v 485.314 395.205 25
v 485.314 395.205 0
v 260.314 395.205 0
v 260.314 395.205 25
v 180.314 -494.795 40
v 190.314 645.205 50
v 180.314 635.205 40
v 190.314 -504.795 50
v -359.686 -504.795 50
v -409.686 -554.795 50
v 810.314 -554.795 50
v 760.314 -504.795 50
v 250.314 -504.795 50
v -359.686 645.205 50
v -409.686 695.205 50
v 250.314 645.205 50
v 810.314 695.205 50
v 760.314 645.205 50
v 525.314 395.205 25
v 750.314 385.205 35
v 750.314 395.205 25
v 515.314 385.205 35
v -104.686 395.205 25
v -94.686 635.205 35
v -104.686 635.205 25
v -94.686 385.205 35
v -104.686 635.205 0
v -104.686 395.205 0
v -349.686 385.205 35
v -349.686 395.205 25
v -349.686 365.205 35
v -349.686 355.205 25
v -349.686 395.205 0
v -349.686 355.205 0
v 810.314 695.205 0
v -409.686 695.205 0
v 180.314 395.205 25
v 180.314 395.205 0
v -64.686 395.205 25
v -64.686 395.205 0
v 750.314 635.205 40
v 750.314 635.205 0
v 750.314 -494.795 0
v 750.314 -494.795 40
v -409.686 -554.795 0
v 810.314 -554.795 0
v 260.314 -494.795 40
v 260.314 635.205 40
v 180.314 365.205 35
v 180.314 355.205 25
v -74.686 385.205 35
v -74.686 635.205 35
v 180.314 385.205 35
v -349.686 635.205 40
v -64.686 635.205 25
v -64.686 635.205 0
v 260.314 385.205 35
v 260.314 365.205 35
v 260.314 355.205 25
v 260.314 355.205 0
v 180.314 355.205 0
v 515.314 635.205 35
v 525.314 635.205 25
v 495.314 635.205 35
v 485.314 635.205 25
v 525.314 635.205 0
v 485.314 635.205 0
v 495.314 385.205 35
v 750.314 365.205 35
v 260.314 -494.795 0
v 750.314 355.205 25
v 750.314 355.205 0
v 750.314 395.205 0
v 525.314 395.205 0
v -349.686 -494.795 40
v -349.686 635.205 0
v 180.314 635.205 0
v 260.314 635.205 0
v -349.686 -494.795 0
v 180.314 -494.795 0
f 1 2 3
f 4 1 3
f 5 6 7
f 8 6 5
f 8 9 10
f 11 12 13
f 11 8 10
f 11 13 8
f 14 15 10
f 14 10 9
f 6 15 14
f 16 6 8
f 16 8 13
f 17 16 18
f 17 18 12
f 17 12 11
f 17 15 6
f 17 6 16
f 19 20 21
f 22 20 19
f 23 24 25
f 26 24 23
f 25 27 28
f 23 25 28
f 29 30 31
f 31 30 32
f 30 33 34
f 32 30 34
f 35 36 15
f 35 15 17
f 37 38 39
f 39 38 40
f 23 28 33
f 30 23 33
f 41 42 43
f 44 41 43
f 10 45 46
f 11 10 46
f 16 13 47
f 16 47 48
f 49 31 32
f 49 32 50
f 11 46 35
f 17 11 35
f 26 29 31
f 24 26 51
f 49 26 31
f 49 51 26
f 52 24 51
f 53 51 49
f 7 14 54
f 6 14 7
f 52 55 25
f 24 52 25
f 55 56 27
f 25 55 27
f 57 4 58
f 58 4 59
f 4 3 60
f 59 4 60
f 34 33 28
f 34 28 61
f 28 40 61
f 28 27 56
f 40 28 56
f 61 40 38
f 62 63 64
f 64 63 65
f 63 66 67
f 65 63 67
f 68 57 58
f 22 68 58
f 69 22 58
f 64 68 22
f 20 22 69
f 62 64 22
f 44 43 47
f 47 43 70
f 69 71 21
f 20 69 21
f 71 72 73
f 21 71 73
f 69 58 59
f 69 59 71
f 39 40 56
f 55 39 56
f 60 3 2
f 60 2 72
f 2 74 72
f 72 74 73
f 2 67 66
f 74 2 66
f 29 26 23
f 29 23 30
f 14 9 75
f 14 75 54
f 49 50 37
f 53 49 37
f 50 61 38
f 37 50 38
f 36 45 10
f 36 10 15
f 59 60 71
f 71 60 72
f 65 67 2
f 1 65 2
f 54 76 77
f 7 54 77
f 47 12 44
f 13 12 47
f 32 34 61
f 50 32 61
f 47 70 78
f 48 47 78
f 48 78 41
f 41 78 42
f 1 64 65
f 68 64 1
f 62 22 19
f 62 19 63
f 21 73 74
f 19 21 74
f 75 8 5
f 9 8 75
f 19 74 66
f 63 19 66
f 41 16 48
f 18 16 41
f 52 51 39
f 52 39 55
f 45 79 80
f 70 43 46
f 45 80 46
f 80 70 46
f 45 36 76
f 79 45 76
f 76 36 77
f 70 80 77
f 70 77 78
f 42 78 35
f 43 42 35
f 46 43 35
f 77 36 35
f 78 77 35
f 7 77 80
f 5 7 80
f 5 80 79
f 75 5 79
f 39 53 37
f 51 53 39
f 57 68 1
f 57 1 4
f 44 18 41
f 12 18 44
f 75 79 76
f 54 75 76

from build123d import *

# Parameters (mm, degrees)
F0_W      = 1220
F0_H      = 1250
F1_DEPTH  = 50
F2_DEPTH  = 35
F3_SIZE   = 10
F3_2_SIZE = 10
F3_3_SIZE = 10


with BuildPart() as f1:
    # F0 (on Top) → F1 (new body)
    with BuildSketch(Plane.XY):
        with Locations((200.3141621128, 70.2047318473)):
            Rectangle(F0_W, F0_H)
        Polygon((-349.6858378872, -494.7952681527), (-349.6858378872, 355.2047318473), (-349.6858378872, 395.2047318473), (-349.6858378872, 635.2047318473), (-104.6858378872, 635.2047318473), (-64.6858378872, 635.2047318473), (180.3141621128, 635.2047318473), (180.3141621128, 395.2047318473), (180.3141621128, 355.2047318473), (180.3141621128, -494.7952681527), align=None, mode=Mode.SUBTRACT)
        Polygon((260.3141621128, -494.7952681527), (260.3141621128, 355.2047318473), (260.3141621128, 395.2047318473), (260.3141621128, 635.2047318473), (485.3141621128, 635.2047318473), (525.3141621128, 635.2047318473), (750.3141621128, 635.2047318473), (750.3141621128, 395.2047318473), (750.3141621128, 355.2047318473), (750.3141621128, -494.7952681527), align=None, mode=Mode.SUBTRACT)
    extrude(amount=F1_DEPTH)

    # F3
    f3_edges = [f1.edges().sort_by_distance(p)[0] for p in [
        (-349.685838, 70.204732, 50),
        (-84.685838, 635.204732, 50),
        (180.314162, 70.204732, 50),
        (260.314162, 70.204732, 50),
        (505.314162, 635.204732, 50),
        (750.314162, 70.204732, 50),
        (505.314162, -494.795268, 50),
        (-84.685838, -494.795268, 50),
    ]]
    chamfer(f3_edges, length=F3_SIZE)


with BuildPart() as f2:
    # F0 (on Top) → F2 (new body)
    with BuildSketch(Plane.XY):
        Polygon((-349.6858378872, 395.2047318473), (-349.6858378872, 355.2047318473), (180.3141621128, 355.2047318473), (180.3141621128, 395.2047318473), (-64.6858378872, 395.2047318473), (-64.6858378872, 635.2047318473), (-104.6858378872, 635.2047318473), (-104.6858378872, 395.2047318473), align=None)
    extrude(amount=F2_DEPTH)

    # F3#2
    f3_2_edges = [f2.edges().sort_by_distance(p)[0] for p in [
        (-84.685838, 355.204732, 35),
        (57.814162, 395.204732, 35),
        (-64.685838, 515.204732, 35),
        (-104.685838, 515.204732, 35),
        (-227.185838, 395.204732, 35),
    ]]
    chamfer(f3_2_edges, length=F3_2_SIZE)


with BuildPart() as f2b:
    # F0 (on Top) → F2, piece 2 (new body)
    with BuildSketch(Plane.XY):
        Polygon((260.3141621128, 395.2047318473), (260.3141621128, 355.2047318473), (750.3141621128, 355.2047318473), (750.3141621128, 395.2047318473), (525.3141621128, 395.2047318473), (525.3141621128, 635.2047318473), (485.3141621128, 635.2047318473), (485.3141621128, 395.2047318473), align=None)
    extrude(amount=F2_DEPTH)

    # F3#3
    f3_3_edges = [f2b.edges().sort_by_distance(p)[0] for p in [
        (505.314162, 355.204732, 35),
        (372.814162, 395.204732, 35),
        (525.314162, 515.204732, 35),
        (637.814162, 395.204732, 35),
        (485.314162, 515.204732, 35),
    ]]
    chamfer(f3_3_edges, length=F3_3_SIZE)


solid = Compound([f1.part, f2.part, f2b.part])
